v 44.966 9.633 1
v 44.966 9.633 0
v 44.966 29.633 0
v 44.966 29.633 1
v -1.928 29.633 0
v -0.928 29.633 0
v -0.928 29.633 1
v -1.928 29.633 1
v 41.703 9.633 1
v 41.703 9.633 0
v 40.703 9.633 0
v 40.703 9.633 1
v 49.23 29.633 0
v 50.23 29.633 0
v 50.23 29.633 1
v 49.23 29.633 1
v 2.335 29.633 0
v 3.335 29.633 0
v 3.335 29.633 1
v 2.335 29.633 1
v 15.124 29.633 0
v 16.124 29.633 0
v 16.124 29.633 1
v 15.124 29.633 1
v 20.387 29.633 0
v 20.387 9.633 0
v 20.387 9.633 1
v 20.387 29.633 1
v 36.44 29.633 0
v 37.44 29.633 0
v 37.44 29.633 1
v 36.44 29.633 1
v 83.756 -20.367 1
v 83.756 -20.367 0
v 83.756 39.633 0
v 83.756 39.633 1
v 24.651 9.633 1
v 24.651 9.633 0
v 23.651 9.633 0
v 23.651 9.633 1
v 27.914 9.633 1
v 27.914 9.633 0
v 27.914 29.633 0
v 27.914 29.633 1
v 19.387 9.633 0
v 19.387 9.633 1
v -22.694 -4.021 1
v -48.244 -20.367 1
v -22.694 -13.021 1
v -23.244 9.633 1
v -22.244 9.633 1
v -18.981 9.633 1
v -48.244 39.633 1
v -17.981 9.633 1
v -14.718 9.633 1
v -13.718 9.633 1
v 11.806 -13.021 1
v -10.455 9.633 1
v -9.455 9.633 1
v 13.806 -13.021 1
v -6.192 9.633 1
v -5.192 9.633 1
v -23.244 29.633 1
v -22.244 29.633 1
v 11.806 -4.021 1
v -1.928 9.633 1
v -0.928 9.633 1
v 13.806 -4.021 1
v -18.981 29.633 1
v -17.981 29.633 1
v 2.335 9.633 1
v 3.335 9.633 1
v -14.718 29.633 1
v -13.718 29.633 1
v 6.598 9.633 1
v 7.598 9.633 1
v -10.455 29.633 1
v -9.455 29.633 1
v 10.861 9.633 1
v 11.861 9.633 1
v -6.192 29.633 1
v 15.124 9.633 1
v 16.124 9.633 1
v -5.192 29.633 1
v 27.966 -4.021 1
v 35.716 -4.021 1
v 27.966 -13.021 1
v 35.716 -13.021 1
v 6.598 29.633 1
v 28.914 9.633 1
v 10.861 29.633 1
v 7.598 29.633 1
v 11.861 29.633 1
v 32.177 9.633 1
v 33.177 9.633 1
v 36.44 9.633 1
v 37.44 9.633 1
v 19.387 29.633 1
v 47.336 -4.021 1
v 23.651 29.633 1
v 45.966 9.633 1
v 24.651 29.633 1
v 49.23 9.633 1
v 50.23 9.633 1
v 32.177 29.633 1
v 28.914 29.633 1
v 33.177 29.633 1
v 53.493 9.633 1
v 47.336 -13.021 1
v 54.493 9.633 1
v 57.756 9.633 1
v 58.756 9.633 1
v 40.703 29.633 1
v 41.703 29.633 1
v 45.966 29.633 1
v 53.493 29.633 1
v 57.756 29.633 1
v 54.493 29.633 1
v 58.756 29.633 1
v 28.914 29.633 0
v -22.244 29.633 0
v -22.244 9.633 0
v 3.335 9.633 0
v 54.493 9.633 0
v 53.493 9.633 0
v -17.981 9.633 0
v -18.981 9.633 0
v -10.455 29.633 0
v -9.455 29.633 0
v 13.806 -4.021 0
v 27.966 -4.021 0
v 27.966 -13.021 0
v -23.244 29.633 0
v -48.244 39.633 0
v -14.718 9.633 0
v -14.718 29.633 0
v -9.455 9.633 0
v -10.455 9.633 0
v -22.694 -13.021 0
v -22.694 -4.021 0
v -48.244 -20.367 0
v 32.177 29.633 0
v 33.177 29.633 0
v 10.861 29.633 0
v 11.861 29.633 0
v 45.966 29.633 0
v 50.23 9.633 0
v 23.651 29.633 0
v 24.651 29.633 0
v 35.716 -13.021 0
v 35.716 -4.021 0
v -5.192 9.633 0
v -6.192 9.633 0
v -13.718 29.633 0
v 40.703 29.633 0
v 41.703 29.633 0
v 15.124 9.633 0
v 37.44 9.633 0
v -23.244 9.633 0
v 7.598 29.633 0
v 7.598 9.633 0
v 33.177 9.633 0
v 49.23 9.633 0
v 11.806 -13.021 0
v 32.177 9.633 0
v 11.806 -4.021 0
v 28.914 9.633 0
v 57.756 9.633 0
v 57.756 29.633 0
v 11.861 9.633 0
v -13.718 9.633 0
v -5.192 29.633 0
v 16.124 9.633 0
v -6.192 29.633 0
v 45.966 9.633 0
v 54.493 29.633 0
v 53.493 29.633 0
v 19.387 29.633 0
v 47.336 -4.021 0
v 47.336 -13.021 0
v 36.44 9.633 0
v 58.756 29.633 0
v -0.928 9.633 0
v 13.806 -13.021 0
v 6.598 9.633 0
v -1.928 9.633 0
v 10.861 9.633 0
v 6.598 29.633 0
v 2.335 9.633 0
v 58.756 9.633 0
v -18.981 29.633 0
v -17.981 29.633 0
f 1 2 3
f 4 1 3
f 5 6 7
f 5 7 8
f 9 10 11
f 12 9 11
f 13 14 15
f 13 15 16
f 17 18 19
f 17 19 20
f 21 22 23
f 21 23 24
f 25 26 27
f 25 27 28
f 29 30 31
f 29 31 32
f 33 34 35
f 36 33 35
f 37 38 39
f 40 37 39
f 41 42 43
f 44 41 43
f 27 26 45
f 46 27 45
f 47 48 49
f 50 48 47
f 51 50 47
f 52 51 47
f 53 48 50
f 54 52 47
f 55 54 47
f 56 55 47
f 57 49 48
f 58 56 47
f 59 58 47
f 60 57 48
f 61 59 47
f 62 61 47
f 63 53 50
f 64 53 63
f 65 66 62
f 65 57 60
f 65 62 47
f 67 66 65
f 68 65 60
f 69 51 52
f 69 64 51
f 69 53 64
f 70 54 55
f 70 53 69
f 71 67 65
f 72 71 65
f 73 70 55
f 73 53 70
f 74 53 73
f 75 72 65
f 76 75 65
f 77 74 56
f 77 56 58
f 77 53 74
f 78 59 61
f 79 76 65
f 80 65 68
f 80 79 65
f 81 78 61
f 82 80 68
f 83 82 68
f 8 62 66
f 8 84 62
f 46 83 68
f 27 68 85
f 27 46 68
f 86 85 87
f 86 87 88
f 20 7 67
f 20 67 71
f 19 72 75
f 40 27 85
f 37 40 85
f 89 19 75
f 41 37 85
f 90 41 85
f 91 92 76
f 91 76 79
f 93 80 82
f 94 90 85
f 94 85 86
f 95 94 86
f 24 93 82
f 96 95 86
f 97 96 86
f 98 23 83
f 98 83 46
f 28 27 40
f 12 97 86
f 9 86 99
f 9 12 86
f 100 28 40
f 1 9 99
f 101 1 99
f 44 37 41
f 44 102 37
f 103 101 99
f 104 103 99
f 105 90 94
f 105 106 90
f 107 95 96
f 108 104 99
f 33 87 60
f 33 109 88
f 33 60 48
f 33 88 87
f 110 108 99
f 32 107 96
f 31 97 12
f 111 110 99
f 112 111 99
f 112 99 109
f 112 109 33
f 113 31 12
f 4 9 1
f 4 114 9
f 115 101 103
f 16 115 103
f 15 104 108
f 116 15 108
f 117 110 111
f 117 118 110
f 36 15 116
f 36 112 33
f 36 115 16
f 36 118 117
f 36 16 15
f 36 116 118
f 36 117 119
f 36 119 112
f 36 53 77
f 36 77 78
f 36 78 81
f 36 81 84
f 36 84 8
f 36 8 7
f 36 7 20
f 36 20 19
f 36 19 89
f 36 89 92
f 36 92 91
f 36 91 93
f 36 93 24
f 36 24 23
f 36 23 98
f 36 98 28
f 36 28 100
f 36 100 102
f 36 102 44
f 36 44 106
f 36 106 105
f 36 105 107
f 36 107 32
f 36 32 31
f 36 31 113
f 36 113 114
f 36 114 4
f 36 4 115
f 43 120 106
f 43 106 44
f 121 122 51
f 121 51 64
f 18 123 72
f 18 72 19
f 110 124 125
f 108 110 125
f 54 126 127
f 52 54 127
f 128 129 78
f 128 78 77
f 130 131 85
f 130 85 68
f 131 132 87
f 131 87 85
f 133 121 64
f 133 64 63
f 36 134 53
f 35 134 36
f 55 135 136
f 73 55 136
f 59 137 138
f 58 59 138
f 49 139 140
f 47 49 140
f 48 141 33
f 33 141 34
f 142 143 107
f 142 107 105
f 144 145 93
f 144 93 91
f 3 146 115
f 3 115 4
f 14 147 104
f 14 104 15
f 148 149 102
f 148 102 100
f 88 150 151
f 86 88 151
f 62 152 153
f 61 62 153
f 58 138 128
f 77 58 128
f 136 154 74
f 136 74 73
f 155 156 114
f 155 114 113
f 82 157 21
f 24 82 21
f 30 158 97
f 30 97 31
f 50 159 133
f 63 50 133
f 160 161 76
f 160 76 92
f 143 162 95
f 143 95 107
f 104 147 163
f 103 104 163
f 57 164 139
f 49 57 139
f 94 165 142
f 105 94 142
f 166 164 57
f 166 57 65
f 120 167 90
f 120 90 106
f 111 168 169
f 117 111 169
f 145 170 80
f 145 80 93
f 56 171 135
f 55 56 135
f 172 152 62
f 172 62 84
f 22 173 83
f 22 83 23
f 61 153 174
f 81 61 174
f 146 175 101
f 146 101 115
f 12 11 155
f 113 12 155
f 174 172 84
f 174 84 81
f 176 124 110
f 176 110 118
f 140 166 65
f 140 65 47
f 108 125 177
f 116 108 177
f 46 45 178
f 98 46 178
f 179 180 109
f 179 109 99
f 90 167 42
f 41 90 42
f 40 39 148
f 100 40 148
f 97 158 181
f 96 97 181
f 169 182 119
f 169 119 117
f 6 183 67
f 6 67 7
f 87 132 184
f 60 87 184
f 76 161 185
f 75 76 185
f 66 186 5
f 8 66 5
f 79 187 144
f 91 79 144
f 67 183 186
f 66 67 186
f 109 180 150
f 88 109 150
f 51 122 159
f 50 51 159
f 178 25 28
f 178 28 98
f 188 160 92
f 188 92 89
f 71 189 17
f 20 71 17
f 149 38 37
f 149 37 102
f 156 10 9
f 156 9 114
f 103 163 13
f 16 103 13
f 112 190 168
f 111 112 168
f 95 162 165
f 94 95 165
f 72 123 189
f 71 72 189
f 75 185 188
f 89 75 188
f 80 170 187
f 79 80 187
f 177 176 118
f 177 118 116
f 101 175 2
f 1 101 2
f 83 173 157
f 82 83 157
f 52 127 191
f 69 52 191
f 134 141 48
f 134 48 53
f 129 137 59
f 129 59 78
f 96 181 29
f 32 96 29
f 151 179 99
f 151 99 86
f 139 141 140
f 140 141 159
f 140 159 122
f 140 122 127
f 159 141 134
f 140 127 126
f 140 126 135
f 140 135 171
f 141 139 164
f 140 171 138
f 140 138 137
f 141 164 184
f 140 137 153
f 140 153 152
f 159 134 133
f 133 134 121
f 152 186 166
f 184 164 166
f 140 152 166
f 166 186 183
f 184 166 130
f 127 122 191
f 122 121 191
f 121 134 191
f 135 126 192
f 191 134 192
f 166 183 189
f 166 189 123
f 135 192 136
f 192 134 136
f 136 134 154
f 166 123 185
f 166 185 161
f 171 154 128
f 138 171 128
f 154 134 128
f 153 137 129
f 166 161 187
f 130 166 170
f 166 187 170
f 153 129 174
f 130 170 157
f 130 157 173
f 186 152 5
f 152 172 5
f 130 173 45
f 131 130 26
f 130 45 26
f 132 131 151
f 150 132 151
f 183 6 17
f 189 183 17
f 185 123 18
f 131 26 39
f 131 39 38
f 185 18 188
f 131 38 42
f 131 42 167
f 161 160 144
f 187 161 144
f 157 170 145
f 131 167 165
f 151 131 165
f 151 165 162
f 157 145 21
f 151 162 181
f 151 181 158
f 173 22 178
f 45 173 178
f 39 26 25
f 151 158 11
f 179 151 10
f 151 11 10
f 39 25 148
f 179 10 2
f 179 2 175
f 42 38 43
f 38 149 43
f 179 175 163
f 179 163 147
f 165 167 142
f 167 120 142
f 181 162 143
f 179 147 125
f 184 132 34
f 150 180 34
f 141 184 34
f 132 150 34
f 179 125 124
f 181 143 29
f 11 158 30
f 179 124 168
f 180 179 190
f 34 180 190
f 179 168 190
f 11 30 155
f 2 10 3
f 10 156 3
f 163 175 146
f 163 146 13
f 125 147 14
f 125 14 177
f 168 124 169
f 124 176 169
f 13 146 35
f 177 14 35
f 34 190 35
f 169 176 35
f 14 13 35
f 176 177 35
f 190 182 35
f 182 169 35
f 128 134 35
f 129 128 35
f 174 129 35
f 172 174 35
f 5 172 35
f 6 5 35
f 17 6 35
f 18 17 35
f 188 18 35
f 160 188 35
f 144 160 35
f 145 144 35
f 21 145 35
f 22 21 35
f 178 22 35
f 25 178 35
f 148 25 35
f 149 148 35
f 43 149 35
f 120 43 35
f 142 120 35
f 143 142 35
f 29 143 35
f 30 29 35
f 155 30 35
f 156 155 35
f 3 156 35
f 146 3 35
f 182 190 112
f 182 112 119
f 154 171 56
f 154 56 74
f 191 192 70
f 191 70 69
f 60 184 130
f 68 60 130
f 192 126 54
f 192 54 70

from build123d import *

# Parameters (mm, degrees)
SKETCH1_W           = 132
SKETCH1_H           = 60
BOSS_EXTRUDE1_DEPTH = 1
SKETCH4_W           = 11.62
SKETCH4_H           = 9
SKETCH4_W_2         = 14.16
SKETCH4_W_3         = 34.5
CUT_EXTRUDE3_DEPTH  = 2
SKETCH11_W          = 1
SKETCH11_H          = 20
CUT_EXTRUDE6_DEPTH  = 2


with BuildPart() as part:
    # Sketch1 → Boss-Extrude1 (new body)
    with BuildSketch(Plane.XY):
        with Locations((17.755849622, 9.633412311)):
            Rectangle(SKETCH1_W, SKETCH1_H)
    extrude(amount=BOSS_EXTRUDE1_DEPTH)

    # Sketch4 → Cut-Extrude3 (cut, through all)
    with BuildSketch(Plane(origin=(0, 0, 0), x_dir=(-1, 0, 0), z_dir=(0, 0, -1))):
        with Locations((-41.525849622, -8.521305626)):
            Rectangle(SKETCH4_W, SKETCH4_H)
        with Locations((-20.885849622, -8.521305626)):
            Rectangle(SKETCH4_W_2, SKETCH4_H)
        with Locations((5.444150378, -8.521305626)):
            Rectangle(SKETCH4_W_3, SKETCH4_H)
    extrude(amount=-CUT_EXTRUDE3_DEPTH, mode=Mode.SUBTRACT)

    # Sketch11 → Cut-Extrude6 (cut, through all)
    with BuildSketch(Plane(origin=(0, 0, 0), x_dir=(-1, 0, 0), z_dir=(0, 0, -1))):
        with Locations((-53.992691727, 19.633412311)):
            Rectangle(SKETCH11_W, SKETCH11_H)
        with Locations((-58.255849622, 19.633412311)):
            Rectangle(SKETCH11_W, SKETCH11_H)
        with Locations((-49.729533832, 19.633412311)):
            Rectangle(SKETCH11_W, SKETCH11_H)
        with Locations((-45.466375937, 19.633412311)):
            Rectangle(SKETCH11_W, SKETCH11_H)
        with Locations((-41.203218043, 19.633412311)):
            Rectangle(SKETCH11_W, SKETCH11_H)
        with Locations((-36.940060148, 19.633412311)):
            Rectangle(SKETCH11_W, SKETCH11_H)
        with Locations((-32.676902253, 19.633412311)):
            Rectangle(SKETCH11_W, SKETCH11_H)
        with Locations((-28.413744358, 19.633412311)):
            Rectangle(SKETCH11_W, SKETCH11_H)
        with Locations((-24.150586464, 19.633412311)):
            Rectangle(SKETCH11_W, SKETCH11_H)
        with Locations((-19.887428569, 19.633412311)):
            Rectangle(SKETCH11_W, SKETCH11_H)
        with Locations((-15.624270674, 19.633412311)):
            Rectangle(SKETCH11_W, SKETCH11_H)
        with Locations((-11.36111278, 19.633412311)):
            Rectangle(SKETCH11_W, SKETCH11_H)
        with Locations((-7.097954885, 19.633412311)):
            Rectangle(SKETCH11_W, SKETCH11_H)
        with Locations((-2.83479699, 19.633412311)):
            Rectangle(SKETCH11_W, SKETCH11_H)
        with Locations((1.428360905, 19.633412311)):
            Rectangle(SKETCH11_W, SKETCH11_H)
        with Locations((5.691518799, 19.633412311)):
            Rectangle(SKETCH11_W, SKETCH11_H)
        with Locations((9.954676694, 19.633412311)):
            Rectangle(SKETCH11_W, SKETCH11_H)
        with Locations((14.217834589, 19.633412311)):
            Rectangle(SKETCH11_W, SKETCH11_H)
        with Locations((18.480992484, 19.633412311)):
            Rectangle(SKETCH11_W, SKETCH11_H)
        with Locations((22.744150378, 19.633412311)):
            Rectangle(SKETCH11_W, SKETCH11_H)
    extrude(amount=-CUT_EXTRUDE6_DEPTH, mode=Mode.SUBTRACT)


solid = part.part
